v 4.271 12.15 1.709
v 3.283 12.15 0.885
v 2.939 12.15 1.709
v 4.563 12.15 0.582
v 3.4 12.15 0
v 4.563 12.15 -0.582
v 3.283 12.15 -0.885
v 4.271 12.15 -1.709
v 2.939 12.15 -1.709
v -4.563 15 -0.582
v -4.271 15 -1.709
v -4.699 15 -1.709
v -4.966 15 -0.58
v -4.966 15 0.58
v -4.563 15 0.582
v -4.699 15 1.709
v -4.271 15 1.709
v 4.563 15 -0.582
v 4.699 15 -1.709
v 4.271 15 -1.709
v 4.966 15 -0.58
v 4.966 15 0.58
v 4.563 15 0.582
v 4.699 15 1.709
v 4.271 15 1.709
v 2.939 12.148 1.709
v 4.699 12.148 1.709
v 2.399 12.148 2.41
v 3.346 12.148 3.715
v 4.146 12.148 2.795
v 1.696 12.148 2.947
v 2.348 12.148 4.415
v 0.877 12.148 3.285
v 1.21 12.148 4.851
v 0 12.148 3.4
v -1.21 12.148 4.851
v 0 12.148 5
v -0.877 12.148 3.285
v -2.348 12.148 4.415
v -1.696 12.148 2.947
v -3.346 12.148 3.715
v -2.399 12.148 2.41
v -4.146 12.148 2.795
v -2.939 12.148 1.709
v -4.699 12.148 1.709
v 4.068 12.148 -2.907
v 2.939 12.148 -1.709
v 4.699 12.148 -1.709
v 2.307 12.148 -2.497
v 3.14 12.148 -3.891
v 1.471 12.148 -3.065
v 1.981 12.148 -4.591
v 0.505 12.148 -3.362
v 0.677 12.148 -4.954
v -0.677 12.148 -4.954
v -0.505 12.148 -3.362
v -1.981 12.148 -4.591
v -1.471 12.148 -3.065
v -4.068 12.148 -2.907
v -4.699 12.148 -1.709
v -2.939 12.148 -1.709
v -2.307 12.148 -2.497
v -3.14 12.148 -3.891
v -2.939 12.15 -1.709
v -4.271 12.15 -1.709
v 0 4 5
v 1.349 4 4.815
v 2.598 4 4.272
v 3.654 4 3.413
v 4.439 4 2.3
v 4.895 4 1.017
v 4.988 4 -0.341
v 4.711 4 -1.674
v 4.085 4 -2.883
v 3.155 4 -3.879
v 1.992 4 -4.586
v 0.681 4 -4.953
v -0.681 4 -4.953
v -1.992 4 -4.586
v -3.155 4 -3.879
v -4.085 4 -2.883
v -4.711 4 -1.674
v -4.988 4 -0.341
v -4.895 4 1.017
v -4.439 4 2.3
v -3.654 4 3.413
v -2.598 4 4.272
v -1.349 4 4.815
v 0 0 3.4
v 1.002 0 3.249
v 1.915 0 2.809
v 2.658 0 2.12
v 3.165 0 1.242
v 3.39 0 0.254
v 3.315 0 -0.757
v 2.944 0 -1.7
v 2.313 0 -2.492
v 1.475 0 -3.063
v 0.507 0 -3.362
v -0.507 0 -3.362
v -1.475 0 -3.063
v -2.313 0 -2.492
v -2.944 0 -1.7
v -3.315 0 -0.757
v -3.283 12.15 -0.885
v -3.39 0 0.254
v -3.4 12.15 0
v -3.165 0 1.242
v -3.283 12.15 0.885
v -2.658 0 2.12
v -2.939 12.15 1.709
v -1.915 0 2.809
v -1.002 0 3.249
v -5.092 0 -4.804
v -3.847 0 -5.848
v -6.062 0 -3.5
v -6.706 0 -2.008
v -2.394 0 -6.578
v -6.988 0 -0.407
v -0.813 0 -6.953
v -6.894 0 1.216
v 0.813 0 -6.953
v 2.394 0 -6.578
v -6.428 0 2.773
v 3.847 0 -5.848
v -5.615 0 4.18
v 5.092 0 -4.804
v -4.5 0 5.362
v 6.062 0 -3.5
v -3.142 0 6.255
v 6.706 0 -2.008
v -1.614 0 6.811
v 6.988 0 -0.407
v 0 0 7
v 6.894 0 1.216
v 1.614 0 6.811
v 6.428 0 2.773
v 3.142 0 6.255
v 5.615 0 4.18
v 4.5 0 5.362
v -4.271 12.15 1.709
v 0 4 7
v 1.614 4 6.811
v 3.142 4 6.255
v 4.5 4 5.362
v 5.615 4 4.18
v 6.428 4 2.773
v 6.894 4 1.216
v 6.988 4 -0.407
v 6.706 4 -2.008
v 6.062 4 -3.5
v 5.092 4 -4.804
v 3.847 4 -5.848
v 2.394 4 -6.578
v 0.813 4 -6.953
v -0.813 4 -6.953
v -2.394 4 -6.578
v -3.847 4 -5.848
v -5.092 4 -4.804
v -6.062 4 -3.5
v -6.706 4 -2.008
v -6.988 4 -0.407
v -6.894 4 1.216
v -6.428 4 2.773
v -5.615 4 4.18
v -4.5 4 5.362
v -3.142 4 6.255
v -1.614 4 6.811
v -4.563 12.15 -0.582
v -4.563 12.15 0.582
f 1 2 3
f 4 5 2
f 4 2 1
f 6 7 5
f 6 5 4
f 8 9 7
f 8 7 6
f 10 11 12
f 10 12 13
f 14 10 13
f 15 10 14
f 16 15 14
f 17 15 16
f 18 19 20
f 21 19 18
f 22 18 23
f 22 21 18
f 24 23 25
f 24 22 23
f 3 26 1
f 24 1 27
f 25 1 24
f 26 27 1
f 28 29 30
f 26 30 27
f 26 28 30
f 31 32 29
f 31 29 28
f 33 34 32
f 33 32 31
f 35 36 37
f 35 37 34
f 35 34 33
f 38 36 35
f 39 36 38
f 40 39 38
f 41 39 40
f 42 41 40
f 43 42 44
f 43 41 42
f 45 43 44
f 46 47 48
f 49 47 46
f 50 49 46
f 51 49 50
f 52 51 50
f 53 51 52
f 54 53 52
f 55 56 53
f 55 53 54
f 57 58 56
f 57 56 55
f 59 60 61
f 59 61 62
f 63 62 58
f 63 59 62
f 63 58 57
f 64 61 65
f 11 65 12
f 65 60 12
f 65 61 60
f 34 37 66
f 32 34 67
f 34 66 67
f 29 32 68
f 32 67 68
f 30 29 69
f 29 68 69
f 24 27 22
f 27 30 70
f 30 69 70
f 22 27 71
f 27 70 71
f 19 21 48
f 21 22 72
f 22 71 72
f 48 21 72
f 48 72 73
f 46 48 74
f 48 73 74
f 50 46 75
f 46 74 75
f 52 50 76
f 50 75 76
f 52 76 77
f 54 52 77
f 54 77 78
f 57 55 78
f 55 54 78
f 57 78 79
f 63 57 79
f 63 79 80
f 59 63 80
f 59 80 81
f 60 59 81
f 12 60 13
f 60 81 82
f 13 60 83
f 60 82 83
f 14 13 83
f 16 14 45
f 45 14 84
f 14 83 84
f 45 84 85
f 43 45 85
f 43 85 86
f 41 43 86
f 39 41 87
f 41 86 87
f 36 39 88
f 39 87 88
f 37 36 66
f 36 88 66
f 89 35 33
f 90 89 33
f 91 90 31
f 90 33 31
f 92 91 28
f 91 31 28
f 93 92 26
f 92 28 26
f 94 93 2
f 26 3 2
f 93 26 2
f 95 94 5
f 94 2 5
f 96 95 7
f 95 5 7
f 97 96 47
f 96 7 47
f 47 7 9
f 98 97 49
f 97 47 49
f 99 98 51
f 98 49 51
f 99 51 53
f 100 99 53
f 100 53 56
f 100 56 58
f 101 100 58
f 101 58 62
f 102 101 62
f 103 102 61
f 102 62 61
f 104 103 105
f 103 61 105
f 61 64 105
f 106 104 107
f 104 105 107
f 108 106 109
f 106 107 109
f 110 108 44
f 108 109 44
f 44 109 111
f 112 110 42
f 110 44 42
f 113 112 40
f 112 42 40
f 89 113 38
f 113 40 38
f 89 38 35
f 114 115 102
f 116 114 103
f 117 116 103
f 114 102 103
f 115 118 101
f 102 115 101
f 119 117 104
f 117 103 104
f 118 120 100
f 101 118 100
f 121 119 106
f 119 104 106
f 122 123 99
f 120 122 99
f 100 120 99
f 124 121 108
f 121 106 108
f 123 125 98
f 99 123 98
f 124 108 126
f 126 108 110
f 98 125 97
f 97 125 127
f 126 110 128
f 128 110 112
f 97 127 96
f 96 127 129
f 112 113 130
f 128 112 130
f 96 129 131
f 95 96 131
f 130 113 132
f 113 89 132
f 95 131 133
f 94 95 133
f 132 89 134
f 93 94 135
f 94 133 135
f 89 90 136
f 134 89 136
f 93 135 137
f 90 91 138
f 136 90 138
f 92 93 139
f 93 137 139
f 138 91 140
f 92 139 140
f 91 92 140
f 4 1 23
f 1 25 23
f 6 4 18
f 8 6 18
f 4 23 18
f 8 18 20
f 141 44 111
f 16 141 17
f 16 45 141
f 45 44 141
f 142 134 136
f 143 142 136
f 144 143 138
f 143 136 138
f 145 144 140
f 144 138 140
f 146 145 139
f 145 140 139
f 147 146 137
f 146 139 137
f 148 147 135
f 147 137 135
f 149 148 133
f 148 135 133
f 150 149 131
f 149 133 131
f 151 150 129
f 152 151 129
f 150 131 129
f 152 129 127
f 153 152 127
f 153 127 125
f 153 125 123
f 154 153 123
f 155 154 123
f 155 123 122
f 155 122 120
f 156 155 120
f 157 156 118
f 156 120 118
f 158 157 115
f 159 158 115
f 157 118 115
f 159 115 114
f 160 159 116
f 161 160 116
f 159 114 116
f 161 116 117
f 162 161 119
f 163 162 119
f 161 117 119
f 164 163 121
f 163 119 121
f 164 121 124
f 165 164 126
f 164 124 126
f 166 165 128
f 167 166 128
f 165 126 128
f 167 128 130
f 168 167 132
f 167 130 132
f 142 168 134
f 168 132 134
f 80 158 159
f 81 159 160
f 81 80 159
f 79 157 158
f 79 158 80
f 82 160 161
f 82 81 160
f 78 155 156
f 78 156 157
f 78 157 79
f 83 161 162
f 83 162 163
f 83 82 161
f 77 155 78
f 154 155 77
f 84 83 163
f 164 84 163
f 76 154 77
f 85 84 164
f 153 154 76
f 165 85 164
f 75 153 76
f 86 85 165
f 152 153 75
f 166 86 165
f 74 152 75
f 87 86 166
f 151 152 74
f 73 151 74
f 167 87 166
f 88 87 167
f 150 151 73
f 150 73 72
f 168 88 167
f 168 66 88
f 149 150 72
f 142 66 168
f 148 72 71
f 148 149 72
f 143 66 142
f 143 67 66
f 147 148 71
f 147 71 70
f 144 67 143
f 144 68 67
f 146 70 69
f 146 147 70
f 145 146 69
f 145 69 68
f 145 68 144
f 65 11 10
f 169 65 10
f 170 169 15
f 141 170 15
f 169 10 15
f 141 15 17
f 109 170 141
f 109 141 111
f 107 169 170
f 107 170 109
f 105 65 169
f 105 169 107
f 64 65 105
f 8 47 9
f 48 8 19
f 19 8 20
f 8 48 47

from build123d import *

# Parameters (mm, degrees)
SKETCH_1_R                   = 7
EXTRUDE_1_DEPTH              = 4
SKETCH_5_R                   = 5
EXTRUDE_2_DEPTH              = 11
HOLE_WIZARD_M8_1_D           = 6.8
HOLE_WIZARD_M8_1_ON_FACE_2_D = 6.8
CUT_EXTRUDE_4_DEPTH          = 21.443853316
CUT_EXTRUDE_4_DEPTH_BACK     = 21.443853316
SKETCH_11_W                  = 5.891851166
SKETCH_11_H                  = 2.9
SKETCH_11_W_2                = 4.303127725
SKETCH_12_R                  = 4.6
CUT_EXTRUDE_5_DEPTH          = 2.85


with BuildPart() as part:
    # 草图1 → 凸台-拉伸1 (new body)
    with BuildSketch(Plane(origin=(0, 0, 0), x_dir=(1, 0, 0), z_dir=(0, 1, 0))):
        with Locations(Location((0, 0, 0), (0, 0, 270))):
            Circle(SKETCH_1_R)
    extrude(amount=EXTRUDE_1_DEPTH)

    # 草图5 → 凸台-拉伸2 (add)
    with BuildSketch(Plane(origin=(0, 4, 0), x_dir=(1, 0, 0), z_dir=(0, 1, 0))):
        with Locations(Location((0, 0, 0), (0, 0, 270))):
            Circle(SKETCH_5_R)
    extrude(amount=EXTRUDE_2_DEPTH)

    # M8 螺纹孔1 (through all)
    with Locations(Plane(origin=(0, 0, 0), x_dir=(0, 0, -1), z_dir=(0, -1, 0))):
        with Locations((0, 0)):
            Hole(HOLE_WIZARD_M8_1_D / 2)

    # M8 螺纹孔1 on face 2 (through all)
    with Locations(Plane.ZX.offset(15)):
        with Locations((0, 0)):
            Hole(HOLE_WIZARD_M8_1_ON_FACE_2_D / 2)

    # 草图11 → 切除-拉伸4 (cut, two sides: drawn at the far end of the back side and taken through both)
    with BuildSketch(Plane(origin=(4.997963928, 0, 0), x_dir=(0, 0, -1), z_dir=(1, 0, 0)).offset(-CUT_EXTRUDE_4_DEPTH_BACK)):
        with Locations((4.654854154, 13.597531036)):
            Rectangle(SKETCH_11_W, SKETCH_11_H)
        with Locations((-3.860492434, 13.597531036)):
            Rectangle(SKETCH_11_W_2, SKETCH_11_H)
    extrude(amount=CUT_EXTRUDE_4_DEPTH + CUT_EXTRUDE_4_DEPTH_BACK, mode=Mode.SUBTRACT)

    # 草图12 → 切除-拉伸5 (cut)
    with BuildSketch(Plane(origin=(0, 15, 0), x_dir=(1, 0, 0), z_dir=(0, 1, 0))):
        Circle(SKETCH_12_R)
    extrude(amount=-CUT_EXTRUDE_5_DEPTH, mode=Mode.SUBTRACT)


solid = part.part
